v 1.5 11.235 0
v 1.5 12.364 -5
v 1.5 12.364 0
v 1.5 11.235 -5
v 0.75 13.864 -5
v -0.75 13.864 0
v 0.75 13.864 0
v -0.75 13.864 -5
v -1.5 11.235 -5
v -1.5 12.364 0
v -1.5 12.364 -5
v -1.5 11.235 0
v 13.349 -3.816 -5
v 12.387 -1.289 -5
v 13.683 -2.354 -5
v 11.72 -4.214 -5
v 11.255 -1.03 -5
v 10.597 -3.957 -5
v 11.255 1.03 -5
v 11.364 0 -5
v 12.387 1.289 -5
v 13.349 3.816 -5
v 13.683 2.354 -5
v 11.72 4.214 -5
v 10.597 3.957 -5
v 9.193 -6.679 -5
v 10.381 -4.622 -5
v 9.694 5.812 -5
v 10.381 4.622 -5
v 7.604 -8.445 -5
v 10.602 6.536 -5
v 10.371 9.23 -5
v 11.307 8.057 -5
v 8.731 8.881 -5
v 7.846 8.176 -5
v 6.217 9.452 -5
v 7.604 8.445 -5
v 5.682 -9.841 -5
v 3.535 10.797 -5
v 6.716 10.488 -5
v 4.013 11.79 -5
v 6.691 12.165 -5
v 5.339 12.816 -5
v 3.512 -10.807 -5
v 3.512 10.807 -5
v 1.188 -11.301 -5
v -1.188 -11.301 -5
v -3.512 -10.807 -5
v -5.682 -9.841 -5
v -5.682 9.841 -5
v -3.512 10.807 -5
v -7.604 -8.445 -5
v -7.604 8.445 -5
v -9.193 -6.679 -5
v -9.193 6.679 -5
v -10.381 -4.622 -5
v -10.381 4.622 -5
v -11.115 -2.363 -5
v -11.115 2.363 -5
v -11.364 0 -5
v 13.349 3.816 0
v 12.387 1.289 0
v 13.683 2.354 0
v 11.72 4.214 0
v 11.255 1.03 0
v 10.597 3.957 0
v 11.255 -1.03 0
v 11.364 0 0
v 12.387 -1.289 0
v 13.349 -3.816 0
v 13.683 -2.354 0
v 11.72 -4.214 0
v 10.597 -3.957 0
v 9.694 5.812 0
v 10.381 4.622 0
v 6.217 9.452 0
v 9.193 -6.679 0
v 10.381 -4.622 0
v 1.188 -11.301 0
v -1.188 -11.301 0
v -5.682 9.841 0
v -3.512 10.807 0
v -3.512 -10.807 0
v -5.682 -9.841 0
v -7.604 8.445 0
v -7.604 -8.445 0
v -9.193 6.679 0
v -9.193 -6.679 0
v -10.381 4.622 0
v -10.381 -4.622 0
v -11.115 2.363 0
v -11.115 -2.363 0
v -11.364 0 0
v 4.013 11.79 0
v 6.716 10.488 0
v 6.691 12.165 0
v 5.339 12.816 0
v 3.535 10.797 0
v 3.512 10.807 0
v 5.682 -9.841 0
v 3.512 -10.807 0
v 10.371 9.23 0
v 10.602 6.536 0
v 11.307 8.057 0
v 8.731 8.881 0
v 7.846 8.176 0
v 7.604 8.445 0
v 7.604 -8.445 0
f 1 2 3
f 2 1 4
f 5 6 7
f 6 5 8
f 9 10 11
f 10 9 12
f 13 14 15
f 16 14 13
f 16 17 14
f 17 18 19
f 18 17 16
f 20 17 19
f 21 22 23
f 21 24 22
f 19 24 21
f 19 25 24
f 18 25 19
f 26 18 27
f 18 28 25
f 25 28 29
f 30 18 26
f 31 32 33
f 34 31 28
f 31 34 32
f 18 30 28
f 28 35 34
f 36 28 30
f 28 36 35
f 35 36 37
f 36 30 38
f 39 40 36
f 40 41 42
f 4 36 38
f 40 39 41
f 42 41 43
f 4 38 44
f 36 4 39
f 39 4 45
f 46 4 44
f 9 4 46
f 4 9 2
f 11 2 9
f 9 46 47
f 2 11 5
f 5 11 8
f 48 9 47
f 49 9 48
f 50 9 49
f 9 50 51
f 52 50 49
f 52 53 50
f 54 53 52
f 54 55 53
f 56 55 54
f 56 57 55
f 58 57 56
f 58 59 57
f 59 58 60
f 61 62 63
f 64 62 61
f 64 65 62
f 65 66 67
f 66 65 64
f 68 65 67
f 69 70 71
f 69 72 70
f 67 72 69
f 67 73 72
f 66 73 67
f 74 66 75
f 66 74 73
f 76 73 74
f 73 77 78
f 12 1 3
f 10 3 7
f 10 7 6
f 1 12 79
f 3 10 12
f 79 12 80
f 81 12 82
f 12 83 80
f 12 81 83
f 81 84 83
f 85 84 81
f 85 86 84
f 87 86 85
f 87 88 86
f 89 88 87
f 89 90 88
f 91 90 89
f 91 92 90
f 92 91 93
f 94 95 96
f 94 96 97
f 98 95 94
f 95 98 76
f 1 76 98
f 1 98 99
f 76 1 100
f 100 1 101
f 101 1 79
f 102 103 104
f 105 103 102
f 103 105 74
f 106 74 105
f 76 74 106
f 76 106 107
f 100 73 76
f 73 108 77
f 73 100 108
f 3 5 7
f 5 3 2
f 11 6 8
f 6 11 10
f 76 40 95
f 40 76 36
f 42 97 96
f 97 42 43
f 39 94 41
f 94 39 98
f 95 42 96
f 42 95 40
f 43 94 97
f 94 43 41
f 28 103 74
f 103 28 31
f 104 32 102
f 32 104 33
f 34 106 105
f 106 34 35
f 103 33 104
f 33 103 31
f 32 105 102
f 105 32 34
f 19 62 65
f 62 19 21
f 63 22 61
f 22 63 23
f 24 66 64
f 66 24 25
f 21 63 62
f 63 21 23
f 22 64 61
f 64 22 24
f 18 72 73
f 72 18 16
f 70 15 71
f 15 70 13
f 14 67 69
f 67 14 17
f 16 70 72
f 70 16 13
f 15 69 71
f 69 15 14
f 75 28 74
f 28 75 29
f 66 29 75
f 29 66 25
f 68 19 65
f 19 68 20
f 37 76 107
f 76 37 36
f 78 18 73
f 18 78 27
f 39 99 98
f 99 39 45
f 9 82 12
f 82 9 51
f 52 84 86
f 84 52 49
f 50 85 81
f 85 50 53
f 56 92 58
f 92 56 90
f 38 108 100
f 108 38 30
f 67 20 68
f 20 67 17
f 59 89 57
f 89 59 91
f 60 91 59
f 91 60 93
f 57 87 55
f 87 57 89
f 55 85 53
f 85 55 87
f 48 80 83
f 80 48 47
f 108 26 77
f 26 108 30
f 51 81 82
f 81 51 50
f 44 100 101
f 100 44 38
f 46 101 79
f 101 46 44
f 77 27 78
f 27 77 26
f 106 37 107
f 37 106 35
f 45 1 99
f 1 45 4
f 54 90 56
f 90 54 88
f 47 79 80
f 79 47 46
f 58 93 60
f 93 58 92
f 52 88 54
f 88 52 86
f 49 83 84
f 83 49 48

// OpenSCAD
//use <gearModule.scad>

numberOfTeeth = 20;
widthOfTeeth = 4;
heightOfTeeth = 5;
thicknessOfGear = 5;
radiusOfHoleForShaft = 4.242640687;  //If shaft is square, find the square of one side,
sidesOfShaft = 4;                    //multiply by two and then square root that to get radius
//diameter = ((teethNo x 1.7 x teethWidth)/pi)+ 2teethHeight

module tooth(width, thickness, height){
  scale([width/5,thickness/5,height/10]){
    difference(){
      translate([-2.5,0,0])
      cube([5,5,10]);
      translate([5+1.25-2.5,0-1,0])
      rotate([0,-14.0362434,0])
        cube([5,5+2,12]);
      translate([0-1.25-2.5,0+5+1,0])
      rotate([0,-14.0362434,180])
        cube([5,5+2,12]);
    }
  }
}
module gear(toothNo, toothWidth, toothHeight, thickness,holeRadius,holeSides){
  radius = (toothWidth*1.7*toothNo)/3.141592653589793238/2;
  rotate([-90,0,0])
  difference(){
    union(){
      for(i=[0:toothNo]){
        rotate([0,(360/toothNo)*i,0])
        translate([0,0,radius-0.5])
          tooth(toothWidth,thickness,toothHeight);
      }
      translate([0,thickness,0])
      rotate([90,0,0])
        cylinder(r=radius, h=thickness);
    }
  translate([0,thickness+1,0])
  rotate([90,0,0])
    cylinder(r=holeRadius,h=thickness+2,$fn=holeSides);
  }
}

module gear_partial(toothNumber=14,sliceNumber=14,toothWidth=3,
                    toothHeight=3, thickness=5)
{
    radius = (toothWidth*1.7*toothNumber)/3.141592653589793238/2;
    rotate([-90,0,0])

    union(){
      for(i=[0:sliceNumber]){
        rotate([0,(360/toothNumber)*i,0])
        translate([0,0,radius-0.5])
          tooth(toothWidth,thickness,toothHeight);
      }
      translate([0,thickness,0])
      rotate([90,0,0])
        cylinder(r=radius, h=thickness);
    }
  
}

gear_partial(sliceNumber = 4);

/*
module gear2(thick=5,flip=false) // height 15
{
    translate([0,0,0])
    intersection()
    {
        //thick = 5;
        translate([0,0,thick])
            gear(toothNo=14, toothWidth=2,
                 toothHeight=3, thickness=thick,
                 holeRadius=0,holeSides=4);

        union()
        {
            r1=11.5;
            r2 = 8.5;
            
            if(flip) {
            cylinder( r1=r2,r2=r1,h=thick/4);
            translate([0,0,thick/4]) cylinder( r1=r1,r2=r1,h=3*thick/4);
            //translate([0,0,3*thick/4]) cylinder( r1=r1,r2=r2,h=thick/4);
            }
            else
            {
            //cylinder( r1=r2,r2=r1,h=thick/4);
            translate([0,0,0]) cylinder( r1=r1,r2=r1,h=3*thick/4);
            translate([0,0,3*thick/4]) cylinder( r1=r1,r2=r2,h=thick/4);
            }
        }
    }
}



module spool(a=1,r1=8.5,r2=7.5,maintrackextra=0) {
    
    
    //middle
    hull() {
        translate( [0,0,0] )
            cylinder( r1=r1, r2=r2, h=a );
        translate( [0,10,0] )
            cylinder( r1=r1, r2=r2, h=a );
    }
    
    hull() {
        translate( [0,0,a] )
            cylinder( r1=r2, r2=r2, h=a+maintrackextra );
        translate( [0,10,a] )
            cylinder( r1=r2, r2=r2, h=a+maintrackextra );
    }
    hull() {
        translate( [0,0,2*a+maintrackextra] )
            cylinder( r1=r2, r2=r1, h=a );
        translate( [0,10,2*a+maintrackextra] )
            cylinder( r1=r2, r2=r1, h=a );
    }
}

module bottom(l=8)
{
    // 3/4 of a gear
    intersection()
    {
        gear2(4);
        translate([-10,-12,0]) cube([20,12,5]); // cut in half
        rotate([0,0,-30]) translate([-10,-12,0]) cube([20,12,5]); // cut top couple teeth
    }
    // structure between gears:
    hull() {
        cylinder( d=15.1, h=4 );
        translate([0,l,0]) cylinder( d=15.1, h=4 );
    }
    // second gear, rotated to fit properly into first one's teeth
    
    translate([0,l,0]) mirror([0,1,0]) intersection()
    {
        rotate([0,0,360/14/2]) gear2(4);
        translate([-10,-12-2,0]) cube([20,12,5]); // cut in half
        rotate([0,0,-35]) translate([-10,-12,0]) cube([20,12,5]); // cut top couple teeth
    }
}

module spool2(r1=8.5,r2=7.5,a=1,b=1,c=1,length=8) {
    
    
    //middle
    hull() {
        translate( [0,0,0] )
            cylinder( r1=r1, r2=r2, h=a );
        translate( [0,length,0] )
            cylinder( r1=r1, r2=r2, h=a );
    }
    
    hull() {
        translate( [0,0,a] )
            cylinder( r1=r2, r2=r2, h=b );
        translate( [0,length,a] )
            cylinder( r1=r2, r2=r2, h=b );
    }
    hull() {
        translate( [0,0,a+b] )
            cylinder( r1=r2, r2=r1, h=c );
        translate( [0,length,a+b] )
            cylinder( r1=r2, r2=r1, h=c );
    }
}


// main body
difference()
{
    union()
    {
        bottom(l=8);
        translate([0,0,14]) mirror([0,0,1]) bottom(l=8);
        
        translate([0,0,4])
            spool2(r1=7.5,r2=6,a=0.8,b=1.5,c=0.7,length=8);
        translate([0,0,7])
            spool2(r1=7.5,r2=6,a=0.7,b=1.5,c=0.8,length=8);
    }
    hull()  // hole in the middle
    {
        translate([0,0,-1]) cylinder( d=8,h=20 );
        translate([0,8,-1]) cylinder( d=8,h=20 );
    }
}


// Hillberry wire lower support and control wire support
translate( [-7.5-3,0,4-1] ) difference()
{
    intersection()
    {
        union()
        {
            translate([1,0,-2]) cube([3,8,6+2+4]); // start with a cube
            translate([-2,3,-2]) cube([3,2,4+8]); // add a second for control wire
        }
        // cut the outer edges: (to be printable w/o supports)
        translate([3,4,3-0.4+1.5])                          
            rotate([0,45,0])
                cube( [8,8,8], center=true );  // spawn a centered cube
    }
    //rotate([-90,0,0]) cylinder( d=5,h=10, $fn=6 );
    
    // main Hillberry wires
    translate([3,0,3-0.5])                          // 5. move to a track
        rotate([-90,0,0])                           // 4. place flat
            rotate([0,0,30])                        // 3. rotate by half an edge, to be vertical
                translate([0,0,-1])                 // 2. little lower, it will cut hole through
                    cylinder( d=3,h=10, $fn=6 );    // 1. cylinder, vertical
    translate([3,0,3-0.5+3])                          // 5. move to a track
        rotate([-90,0,0])                           // 4. place flat
            rotate([0,0,30])                        // 3. rotate by half an edge, to be vertical
                translate([0,0,-1])                 // 2. little lower, it will cut hole through
                    cylinder( d=3,h=10, $fn=6 );    // 1. cylinder, vertical
    // control wire hole
    translate([1,0,4])
        scale([1.3,3,1.5])
        rotate([-90,0,0])                           // 4. place flat
                translate([0,0,-1])                 // 2. little lower, it will cut hole through
                    
                    // half a cylinder
                    intersection() {
                        rotate([0,0,30])                        // 3. rotate by half an edge, to be vertical
                            cylinder( d=3,h=10, $fn=6 );    // 1. cylinder, vertical
                        translate([-1.5,-1.5,0]) cube([1.5,3,3] );
                    }
}

// Hillberry wire upper support and flex-back mount
translate([7.5,-8.5,0]) difference()
{
    intersection()
    {
        cube([5.5,25.5,14]);
        translate([1,12,7])
            rotate([0,45,0]) cube([11,30,11],center=true);
    }
        // main Hillberry wires
    translate([0,0,3-0.5+3])                          // 5. move to a track
        rotate([-90,0,0])                           // 4. place flat
            rotate([0,0,30])                        // 3. rotate by half an edge, to be vertical
                translate([0,0,-1])                 // 2. little lower, it will cut hole through
                    cylinder( d=3,h=27, $fn=6 );    // 1. cylinder, vertical
    translate([0,0,3-0.5+3+3])                          // 5. move to a track
        rotate([-90,0,0])                           // 4. place flat
            rotate([0,0,30])                        // 3. rotate by half an edge, to be vertical
                translate([0,0,-1])                 // 2. little lower, it will cut hole through
                    cylinder( d=3,h=27, $fn=6 );    // 1. cylinder, vertical
    hull() {
    translate([3.5,0,3-0.5+3])                          // 5. move to a track
        rotate([-90,0,0])                           // 4. place flat
            rotate([0,0,30])                        // 3. rotate by half an edge, to be vertical
                translate([0,0,-1])                 // 2. little lower, it will cut hole through
                    cylinder( d=3,h=27, $fn=6 );    // 1. cylinder, vertical
    translate([3.5,0,3-0.5+3+3])                          // 5. move to a track
        rotate([-90,0,0])                           // 4. place flat
            rotate([0,0,30])                        // 3. rotate by half an edge, to be vertical
                translate([0,0,-1])                 // 2. little lower, it will cut hole through
                    cylinder( d=3,h=27, $fn=6 );    // 1. cylinder, vertical
    }
    
    translate([3.5,12-2-1.5,7-3])
        cube([4,3.5,6]);
    translate([3.5,12+1,7-3])
        cube([4,3.5,6]);
    translate([0,12+2+2,7])
        rotate([-90,0,0]) scale([1,1.3,1]) rotate([0,0,30]) cylinder( d=9,h=20,$fn=6);
    translate([0,12+2+2-17,7])
        rotate([-90,0,0]) rotate([0,0,30]) cylinder( d=10,h=10,$fn=6);

}
// for the flex back - little triangle to support sliding it in
translate([7.5,-8.5,0])
{
    intersection() {
    translate([2,10.3,7-3])
        scale([1.6,1,1]) rotate([0,0,45]) cube([3,3,6]);  // "triangle" - full cube at 45 degrees
    translate([2,10.3,7-3]) 
        cube([3,5,6]);  // slice it in half to form a triangle (slope)
    }
}
//translate([50,0,0])
//part1();



*/
